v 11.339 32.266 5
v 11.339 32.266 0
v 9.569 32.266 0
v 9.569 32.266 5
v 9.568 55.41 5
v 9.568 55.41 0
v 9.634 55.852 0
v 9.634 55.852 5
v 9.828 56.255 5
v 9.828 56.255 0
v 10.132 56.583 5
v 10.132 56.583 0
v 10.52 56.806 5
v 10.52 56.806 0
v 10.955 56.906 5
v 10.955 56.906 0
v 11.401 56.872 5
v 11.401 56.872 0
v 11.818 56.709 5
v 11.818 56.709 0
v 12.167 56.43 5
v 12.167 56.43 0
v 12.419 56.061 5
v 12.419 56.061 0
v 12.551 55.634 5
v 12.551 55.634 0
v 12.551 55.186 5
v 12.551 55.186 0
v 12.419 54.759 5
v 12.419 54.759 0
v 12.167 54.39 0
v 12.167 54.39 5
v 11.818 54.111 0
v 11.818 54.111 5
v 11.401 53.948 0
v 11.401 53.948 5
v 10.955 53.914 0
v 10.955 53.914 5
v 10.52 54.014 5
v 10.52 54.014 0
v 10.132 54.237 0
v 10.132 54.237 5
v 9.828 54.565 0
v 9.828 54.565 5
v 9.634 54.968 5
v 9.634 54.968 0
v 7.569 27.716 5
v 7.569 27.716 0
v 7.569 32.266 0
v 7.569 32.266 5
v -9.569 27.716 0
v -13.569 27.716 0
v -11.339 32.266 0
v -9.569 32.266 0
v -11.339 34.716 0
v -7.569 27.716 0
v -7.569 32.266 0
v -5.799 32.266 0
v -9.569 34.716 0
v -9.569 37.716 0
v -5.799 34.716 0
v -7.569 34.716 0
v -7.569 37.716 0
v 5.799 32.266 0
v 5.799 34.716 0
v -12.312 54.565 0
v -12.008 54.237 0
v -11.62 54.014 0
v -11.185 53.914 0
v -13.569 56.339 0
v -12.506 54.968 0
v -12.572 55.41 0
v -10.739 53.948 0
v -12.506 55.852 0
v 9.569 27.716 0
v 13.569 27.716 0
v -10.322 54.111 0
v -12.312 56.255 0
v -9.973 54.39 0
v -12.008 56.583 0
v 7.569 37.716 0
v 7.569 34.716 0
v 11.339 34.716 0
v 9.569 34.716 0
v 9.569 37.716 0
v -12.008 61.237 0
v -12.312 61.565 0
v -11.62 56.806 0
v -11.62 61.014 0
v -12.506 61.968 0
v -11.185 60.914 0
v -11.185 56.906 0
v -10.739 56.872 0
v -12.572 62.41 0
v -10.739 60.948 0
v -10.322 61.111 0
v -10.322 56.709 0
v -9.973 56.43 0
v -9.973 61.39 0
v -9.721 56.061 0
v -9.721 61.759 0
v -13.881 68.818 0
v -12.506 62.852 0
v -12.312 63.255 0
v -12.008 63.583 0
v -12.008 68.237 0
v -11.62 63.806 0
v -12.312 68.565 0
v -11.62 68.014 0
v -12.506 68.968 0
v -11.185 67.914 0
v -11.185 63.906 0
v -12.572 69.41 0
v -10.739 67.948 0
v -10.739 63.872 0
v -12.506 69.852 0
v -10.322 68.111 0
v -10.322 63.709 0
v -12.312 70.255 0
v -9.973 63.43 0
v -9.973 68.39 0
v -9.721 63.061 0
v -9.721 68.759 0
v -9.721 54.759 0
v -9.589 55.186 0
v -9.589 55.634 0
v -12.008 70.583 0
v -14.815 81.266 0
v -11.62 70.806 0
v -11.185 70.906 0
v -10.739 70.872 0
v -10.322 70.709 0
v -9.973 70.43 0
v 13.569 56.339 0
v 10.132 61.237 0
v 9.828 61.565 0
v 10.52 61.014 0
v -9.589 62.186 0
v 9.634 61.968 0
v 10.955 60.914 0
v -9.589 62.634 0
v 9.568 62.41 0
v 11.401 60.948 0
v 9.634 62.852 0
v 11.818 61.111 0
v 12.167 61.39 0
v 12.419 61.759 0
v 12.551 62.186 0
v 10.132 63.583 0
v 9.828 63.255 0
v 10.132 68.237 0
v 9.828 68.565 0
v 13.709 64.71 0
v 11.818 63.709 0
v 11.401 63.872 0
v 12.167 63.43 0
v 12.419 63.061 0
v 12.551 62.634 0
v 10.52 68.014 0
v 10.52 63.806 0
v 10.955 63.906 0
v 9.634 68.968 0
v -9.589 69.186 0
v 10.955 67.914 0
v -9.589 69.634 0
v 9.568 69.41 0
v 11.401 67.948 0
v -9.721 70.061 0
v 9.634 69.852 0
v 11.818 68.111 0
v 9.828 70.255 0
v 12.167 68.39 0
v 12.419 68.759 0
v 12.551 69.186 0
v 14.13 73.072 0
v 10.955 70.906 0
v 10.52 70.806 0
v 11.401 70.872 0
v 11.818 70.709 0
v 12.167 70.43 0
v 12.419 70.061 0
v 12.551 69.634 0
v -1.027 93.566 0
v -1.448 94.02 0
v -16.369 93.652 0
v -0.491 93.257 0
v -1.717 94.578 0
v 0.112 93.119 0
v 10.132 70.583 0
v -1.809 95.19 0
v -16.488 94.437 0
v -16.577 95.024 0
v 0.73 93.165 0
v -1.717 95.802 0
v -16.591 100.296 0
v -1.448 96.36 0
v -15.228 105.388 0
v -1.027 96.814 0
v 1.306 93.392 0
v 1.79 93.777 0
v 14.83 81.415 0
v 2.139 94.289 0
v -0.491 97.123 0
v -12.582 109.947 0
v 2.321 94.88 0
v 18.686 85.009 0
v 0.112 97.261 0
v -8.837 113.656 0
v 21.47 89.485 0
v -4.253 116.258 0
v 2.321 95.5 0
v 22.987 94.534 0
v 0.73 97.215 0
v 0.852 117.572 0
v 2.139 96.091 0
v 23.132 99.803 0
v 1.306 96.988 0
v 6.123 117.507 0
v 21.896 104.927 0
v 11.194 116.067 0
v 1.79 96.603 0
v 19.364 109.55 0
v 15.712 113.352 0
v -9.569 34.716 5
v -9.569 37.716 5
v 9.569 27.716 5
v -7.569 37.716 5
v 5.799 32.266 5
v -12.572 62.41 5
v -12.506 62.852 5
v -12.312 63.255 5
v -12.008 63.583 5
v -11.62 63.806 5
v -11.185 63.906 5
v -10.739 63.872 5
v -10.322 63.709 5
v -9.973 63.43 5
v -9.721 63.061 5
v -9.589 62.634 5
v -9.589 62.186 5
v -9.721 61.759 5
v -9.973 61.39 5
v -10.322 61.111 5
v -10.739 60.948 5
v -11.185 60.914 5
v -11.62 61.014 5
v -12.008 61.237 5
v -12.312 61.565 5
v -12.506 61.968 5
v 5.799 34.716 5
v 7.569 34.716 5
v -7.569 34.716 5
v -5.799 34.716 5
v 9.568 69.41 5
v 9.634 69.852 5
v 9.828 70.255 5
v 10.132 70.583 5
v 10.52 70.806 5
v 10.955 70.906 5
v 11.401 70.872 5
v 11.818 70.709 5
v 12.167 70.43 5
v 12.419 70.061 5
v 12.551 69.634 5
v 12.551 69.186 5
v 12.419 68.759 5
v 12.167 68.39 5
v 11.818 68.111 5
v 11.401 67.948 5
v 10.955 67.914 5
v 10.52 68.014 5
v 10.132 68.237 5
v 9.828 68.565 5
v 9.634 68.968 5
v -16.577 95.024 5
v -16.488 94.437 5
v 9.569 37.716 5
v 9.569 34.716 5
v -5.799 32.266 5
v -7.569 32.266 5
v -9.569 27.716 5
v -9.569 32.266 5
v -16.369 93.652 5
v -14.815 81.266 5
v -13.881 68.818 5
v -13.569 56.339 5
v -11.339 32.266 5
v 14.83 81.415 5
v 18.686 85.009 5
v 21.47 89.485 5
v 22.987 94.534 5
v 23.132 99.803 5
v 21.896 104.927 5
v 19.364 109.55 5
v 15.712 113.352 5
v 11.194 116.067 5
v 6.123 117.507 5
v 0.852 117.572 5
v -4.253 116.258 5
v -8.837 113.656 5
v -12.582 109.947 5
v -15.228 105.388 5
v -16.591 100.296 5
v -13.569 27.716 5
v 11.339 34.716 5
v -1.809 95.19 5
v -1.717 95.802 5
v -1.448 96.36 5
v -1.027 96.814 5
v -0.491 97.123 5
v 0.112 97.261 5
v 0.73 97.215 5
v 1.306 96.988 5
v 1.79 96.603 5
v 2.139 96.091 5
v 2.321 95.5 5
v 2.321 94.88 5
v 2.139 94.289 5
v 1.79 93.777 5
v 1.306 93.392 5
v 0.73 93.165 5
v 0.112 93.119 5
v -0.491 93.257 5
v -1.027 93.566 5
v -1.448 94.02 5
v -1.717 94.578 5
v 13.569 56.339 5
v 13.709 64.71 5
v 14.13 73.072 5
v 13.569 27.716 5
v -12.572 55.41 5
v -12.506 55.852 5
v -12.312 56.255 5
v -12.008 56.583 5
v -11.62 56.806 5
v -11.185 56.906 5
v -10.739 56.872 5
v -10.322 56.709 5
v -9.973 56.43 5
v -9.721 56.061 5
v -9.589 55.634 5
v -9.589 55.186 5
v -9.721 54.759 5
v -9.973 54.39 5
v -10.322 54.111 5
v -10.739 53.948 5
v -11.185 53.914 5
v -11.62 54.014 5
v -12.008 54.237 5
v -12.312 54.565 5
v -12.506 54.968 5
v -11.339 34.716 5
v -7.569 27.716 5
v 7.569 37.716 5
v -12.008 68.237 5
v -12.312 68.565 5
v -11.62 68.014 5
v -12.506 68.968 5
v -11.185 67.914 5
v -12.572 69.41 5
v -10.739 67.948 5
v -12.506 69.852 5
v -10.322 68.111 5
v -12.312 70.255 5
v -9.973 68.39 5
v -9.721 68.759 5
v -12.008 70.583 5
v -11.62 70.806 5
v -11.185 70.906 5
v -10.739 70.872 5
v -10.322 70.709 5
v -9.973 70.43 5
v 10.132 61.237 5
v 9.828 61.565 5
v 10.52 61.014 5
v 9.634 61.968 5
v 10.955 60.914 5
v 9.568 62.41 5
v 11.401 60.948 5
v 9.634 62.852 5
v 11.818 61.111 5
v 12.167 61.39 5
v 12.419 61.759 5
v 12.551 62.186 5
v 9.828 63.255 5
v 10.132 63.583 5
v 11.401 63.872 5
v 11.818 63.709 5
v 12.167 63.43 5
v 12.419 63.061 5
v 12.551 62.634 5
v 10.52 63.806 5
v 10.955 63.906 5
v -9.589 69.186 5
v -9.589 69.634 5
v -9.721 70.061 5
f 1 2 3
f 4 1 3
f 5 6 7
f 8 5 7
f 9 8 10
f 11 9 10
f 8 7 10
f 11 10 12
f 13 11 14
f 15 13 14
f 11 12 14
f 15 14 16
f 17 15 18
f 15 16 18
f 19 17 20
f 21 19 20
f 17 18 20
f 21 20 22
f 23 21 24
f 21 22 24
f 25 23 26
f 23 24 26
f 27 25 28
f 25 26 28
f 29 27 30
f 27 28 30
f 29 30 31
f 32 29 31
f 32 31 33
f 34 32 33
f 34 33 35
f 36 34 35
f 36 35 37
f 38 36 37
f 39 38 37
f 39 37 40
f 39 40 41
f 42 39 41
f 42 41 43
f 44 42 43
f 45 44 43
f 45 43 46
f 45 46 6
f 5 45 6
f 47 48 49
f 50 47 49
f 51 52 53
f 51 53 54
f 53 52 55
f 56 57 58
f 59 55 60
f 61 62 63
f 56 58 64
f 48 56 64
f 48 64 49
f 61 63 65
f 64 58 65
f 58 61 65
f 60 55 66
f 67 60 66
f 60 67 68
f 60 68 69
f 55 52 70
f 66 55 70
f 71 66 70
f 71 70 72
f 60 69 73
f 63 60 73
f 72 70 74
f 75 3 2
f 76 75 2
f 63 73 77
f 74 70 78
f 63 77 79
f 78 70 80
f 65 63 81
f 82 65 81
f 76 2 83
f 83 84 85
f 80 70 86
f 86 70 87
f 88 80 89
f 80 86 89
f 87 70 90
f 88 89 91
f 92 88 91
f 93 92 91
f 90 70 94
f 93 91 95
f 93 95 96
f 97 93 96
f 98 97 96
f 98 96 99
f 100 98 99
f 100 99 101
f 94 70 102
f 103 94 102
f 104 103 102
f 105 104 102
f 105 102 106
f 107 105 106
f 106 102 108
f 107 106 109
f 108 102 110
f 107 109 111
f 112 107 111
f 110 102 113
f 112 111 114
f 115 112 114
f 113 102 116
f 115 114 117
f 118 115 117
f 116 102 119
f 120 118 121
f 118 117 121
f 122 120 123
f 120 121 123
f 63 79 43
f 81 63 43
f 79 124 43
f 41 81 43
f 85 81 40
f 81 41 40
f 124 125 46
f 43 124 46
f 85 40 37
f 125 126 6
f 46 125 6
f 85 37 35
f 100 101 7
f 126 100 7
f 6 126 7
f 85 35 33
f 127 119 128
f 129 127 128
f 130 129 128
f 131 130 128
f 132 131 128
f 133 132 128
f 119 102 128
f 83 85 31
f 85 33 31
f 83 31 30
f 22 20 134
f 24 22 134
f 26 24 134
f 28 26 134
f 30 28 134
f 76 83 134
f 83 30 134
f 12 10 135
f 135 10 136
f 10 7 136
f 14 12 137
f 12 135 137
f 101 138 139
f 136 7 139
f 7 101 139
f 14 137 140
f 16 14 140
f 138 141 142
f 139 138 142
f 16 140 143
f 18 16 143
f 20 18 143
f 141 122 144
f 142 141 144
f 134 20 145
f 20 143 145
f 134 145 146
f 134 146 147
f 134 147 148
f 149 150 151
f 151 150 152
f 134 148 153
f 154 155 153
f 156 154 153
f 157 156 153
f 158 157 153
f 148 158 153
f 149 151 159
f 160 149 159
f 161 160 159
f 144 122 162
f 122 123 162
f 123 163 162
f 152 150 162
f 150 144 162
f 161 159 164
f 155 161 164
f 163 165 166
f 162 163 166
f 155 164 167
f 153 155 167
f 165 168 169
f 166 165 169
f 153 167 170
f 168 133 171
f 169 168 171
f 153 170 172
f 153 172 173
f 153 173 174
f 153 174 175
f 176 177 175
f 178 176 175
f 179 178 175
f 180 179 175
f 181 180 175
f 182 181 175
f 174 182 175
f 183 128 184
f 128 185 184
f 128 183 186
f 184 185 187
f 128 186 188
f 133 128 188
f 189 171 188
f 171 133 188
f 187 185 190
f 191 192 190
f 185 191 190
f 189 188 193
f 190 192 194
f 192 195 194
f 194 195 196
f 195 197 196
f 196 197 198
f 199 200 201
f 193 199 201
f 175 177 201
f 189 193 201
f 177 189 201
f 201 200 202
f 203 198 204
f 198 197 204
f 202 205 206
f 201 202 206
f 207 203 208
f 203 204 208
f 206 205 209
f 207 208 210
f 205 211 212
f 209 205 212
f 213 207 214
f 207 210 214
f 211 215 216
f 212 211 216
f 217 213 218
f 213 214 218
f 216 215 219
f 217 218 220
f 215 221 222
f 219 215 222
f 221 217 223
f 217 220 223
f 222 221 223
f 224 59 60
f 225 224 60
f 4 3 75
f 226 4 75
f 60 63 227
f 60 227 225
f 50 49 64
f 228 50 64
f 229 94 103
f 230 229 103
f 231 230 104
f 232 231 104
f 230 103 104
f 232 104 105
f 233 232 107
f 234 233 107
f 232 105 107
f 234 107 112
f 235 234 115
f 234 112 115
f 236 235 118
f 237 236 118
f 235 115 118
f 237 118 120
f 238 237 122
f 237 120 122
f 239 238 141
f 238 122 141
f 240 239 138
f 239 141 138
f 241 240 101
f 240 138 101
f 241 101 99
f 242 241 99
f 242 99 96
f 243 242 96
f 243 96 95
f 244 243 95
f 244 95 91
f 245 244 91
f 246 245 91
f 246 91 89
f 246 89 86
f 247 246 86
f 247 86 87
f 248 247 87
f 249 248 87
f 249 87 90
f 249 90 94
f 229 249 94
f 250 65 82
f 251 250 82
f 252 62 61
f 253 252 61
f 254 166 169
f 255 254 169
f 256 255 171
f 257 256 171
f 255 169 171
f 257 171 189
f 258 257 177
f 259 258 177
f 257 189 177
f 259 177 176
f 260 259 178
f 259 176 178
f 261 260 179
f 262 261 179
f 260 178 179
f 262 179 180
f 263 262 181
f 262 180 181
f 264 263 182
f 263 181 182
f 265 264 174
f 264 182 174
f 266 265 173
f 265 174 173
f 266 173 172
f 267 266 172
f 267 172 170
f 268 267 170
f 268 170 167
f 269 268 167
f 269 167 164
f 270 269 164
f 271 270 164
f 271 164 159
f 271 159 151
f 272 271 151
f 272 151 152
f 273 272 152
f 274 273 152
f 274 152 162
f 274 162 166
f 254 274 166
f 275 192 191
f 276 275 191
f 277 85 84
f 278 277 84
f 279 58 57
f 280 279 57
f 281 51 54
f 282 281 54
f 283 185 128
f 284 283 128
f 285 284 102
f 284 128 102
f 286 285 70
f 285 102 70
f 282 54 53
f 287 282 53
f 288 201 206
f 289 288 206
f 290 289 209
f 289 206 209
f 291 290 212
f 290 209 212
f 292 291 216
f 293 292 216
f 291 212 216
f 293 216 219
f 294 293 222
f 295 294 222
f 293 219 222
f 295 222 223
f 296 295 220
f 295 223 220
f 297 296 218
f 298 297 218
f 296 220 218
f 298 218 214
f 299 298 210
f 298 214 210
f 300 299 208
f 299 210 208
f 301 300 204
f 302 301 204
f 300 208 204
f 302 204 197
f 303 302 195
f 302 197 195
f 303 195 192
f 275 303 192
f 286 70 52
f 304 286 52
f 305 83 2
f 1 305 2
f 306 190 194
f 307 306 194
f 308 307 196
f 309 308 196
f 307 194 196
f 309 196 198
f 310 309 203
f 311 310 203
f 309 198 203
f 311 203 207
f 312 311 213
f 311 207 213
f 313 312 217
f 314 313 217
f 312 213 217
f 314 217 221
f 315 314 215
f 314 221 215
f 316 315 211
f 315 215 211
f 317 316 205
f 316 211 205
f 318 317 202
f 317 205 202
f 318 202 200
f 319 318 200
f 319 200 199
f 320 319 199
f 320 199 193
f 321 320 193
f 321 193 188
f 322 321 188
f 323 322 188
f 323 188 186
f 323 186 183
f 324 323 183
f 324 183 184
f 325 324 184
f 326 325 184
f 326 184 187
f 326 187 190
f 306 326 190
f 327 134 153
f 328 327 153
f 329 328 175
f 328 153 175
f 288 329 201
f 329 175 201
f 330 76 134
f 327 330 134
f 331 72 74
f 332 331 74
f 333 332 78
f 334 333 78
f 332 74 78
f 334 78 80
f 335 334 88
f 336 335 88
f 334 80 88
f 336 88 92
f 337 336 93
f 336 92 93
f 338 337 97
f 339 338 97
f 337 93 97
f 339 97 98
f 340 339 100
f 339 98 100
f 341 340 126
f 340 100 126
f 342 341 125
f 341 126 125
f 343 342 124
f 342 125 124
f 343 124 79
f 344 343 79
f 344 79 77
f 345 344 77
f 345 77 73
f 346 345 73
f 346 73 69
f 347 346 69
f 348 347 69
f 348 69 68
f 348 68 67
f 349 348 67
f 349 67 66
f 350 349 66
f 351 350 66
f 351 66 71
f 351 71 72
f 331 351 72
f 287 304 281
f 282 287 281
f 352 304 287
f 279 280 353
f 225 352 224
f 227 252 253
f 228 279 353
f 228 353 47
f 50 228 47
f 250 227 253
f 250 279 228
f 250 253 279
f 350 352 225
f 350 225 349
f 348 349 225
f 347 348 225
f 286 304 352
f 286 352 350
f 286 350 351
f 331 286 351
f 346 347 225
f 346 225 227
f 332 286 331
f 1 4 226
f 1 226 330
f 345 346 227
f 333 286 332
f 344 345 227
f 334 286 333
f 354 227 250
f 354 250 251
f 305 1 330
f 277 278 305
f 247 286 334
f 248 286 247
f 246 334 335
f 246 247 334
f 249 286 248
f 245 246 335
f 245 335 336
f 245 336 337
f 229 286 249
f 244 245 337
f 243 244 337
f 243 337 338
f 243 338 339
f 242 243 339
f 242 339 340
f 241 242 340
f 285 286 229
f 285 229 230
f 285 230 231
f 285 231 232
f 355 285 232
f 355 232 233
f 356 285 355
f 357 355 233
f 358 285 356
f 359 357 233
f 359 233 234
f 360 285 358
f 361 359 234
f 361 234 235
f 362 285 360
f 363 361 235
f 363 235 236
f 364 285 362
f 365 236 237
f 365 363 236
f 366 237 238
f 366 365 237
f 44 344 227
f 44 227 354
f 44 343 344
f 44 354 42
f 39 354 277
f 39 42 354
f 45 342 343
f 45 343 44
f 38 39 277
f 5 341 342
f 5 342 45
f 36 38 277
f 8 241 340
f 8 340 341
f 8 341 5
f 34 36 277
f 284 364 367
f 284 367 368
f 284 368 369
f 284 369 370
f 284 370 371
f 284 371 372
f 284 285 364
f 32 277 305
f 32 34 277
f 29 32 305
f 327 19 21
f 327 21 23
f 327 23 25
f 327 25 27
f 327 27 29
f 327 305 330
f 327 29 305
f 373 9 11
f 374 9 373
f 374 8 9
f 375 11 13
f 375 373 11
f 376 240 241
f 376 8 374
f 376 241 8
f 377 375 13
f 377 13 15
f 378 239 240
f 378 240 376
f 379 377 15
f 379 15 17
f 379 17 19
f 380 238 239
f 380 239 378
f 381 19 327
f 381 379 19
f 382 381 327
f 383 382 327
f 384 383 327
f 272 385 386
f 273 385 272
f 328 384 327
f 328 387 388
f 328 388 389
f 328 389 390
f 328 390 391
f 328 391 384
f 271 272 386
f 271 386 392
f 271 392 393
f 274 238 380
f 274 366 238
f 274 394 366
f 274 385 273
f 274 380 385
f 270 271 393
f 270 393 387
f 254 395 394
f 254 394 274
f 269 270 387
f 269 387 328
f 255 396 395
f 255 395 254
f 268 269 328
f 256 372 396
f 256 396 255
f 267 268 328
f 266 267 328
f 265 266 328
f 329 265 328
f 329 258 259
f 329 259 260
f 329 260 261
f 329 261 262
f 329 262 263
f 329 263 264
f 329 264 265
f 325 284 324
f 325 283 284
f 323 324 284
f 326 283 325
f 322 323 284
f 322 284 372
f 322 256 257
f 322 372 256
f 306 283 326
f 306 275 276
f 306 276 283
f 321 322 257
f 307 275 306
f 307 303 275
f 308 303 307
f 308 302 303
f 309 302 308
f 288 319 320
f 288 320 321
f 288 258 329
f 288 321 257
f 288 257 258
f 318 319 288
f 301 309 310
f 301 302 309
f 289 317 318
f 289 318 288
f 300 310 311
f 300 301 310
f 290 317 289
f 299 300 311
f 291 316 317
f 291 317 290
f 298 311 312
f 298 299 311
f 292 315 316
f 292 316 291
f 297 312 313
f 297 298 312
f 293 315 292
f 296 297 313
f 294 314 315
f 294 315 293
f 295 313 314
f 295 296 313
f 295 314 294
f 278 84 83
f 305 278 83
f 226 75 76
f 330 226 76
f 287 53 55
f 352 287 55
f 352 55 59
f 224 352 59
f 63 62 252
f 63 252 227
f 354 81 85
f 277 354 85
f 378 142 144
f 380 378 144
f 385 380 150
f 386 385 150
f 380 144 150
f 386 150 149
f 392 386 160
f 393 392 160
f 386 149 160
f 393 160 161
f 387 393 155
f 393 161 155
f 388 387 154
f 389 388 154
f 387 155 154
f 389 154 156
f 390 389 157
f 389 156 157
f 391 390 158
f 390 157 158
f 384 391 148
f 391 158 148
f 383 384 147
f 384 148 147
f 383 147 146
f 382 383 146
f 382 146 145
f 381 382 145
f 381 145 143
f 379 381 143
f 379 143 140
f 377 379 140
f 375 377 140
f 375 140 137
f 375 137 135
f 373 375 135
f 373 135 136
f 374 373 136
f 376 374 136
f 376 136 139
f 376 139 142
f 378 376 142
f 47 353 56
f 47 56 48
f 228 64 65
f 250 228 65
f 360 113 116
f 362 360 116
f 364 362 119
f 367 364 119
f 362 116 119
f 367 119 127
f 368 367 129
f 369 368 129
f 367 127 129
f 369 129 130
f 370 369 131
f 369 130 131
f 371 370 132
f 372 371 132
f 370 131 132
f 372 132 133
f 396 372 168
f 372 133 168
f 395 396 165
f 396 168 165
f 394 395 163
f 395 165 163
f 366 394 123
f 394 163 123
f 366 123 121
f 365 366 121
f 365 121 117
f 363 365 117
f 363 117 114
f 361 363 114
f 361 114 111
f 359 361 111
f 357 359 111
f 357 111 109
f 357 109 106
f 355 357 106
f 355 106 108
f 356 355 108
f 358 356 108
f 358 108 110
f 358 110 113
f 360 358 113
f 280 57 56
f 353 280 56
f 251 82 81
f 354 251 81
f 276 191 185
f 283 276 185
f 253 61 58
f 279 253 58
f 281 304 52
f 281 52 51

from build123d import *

# Parameters (mm, degrees)
RESSALTO_EXTRUS_O1_DEPTH = 5
ESBO_O7_R                = 2.076684074
CORTE_EXTRUS_O5_DEPTH    = 6
ESBO_O8_W                = 32.941442616
ESBO_O8_H                = 7.70353162
CORTE_EXTRUS_O6_DEPTH    = 6
ESBO_O9_R                = 1.5
CORTE_EXTRUS_O7_DEPTH    = 6
ESBO_O10_W               = 2
ESBO_O10_H               = 3
CORTE_EXTRUS_O8_DEPTH    = 6


with BuildPart() as part:
    # Esboço1 → Ressalto-extrusão1 (new body)
    with BuildSketch(Plane.XY):
        with BuildLine():
            Line((13.569146061, 27.715579822), (13.569146061, 56.338894978))
            ThreePointArc((13.569146061, 56.338894978), (13.884544414, 68.892766914), (14.829943665, 81.414963086))
            ThreePointArc((14.829943665, 81.414963086), (11.193742071, 116.066691762), (-16.576524471, 95.024435265))
            Line((-16.576524471, 95.024435265), (-16.487894969, 94.437265709))
            Line((-16.487894969, 94.437265709), (-16.369382775, 93.652123615))
            ThreePointArc((-16.369382775, 93.652123615), (-14.270188159, 75.047972701), (-13.569146061, 56.338894978))
            Line((-13.569146061, 56.338894978), (-13.569146061, 27.715579822))
            ThreePointArc((-13.569146061, 27.715579822), (0, 21.02683783), (13.569146061, 27.715579822))
        make_face()
    extrude(amount=RESSALTO_EXTRUS_O1_DEPTH)

    # Esboço7 → Corte-extrusão5 (cut, through all)
    with BuildSketch(Plane(origin=(0, 0, 0), x_dir=(-1, 0, 0), z_dir=(0, 0, -1))):
        with Locations((-0.267564972, 95.19)):
            Circle(ESBO_O7_R)
    extrude(amount=-CORTE_EXTRUS_O5_DEPTH, mode=Mode.SUBTRACT)

    # Esboço8 → Corte-extrusão6 (cut, through all)
    with BuildSketch(Plane.XY.offset(5)):
        with Locations((-2.901575247, 23.863814012)):
            Rectangle(ESBO_O8_W, ESBO_O8_H)
    extrude(amount=-CORTE_EXTRUS_O6_DEPTH, mode=Mode.SUBTRACT)

    # Esboço9 → Corte-extrusão7 (cut, through all)
    with BuildSketch(Plane(origin=(0, 0, 0), x_dir=(-1, 0, 0), z_dir=(0, 0, -1))):
        with Locations((11.072435028, 69.41)):
            Circle(ESBO_O9_R)
        with Locations((11.072435028, 62.41)):
            Circle(ESBO_O9_R)
        with Locations((11.072435028, 55.41)):
            Circle(ESBO_O9_R)
        with Locations((-11.067564972, 69.41)):
            Circle(ESBO_O9_R)
        with Locations((-11.067564972, 62.41)):
            Circle(ESBO_O9_R)
        with Locations((-11.067564972, 55.41)):
            Circle(ESBO_O9_R)
    extrude(amount=-CORTE_EXTRUS_O7_DEPTH, mode=Mode.SUBTRACT)

    # Esboço10 → Corte-extrusão8 (cut, through all)
    with BuildSketch(Plane(origin=(0, 0, 0), x_dir=(-1, 0, 0), z_dir=(0, 0, -1))):
        Polygon((7.569146061, 27.715579822), (9.569146061, 27.715579822), (9.569146061, 32.265579822), (11.339146061, 32.265579822), (11.339146061, 34.715579822), (9.569146061, 34.715579822), (7.569146061, 34.715579822), (5.799146061, 34.715579822), (5.799146061, 32.265579822), (7.569146061, 32.265579822), align=None)
        with Locations((8.569146061, 36.215579822)):
            Rectangle(ESBO_O10_W, ESBO_O10_H)
        Polygon((-9.569146061, 27.715579822), (-7.569146061, 27.715579822), (-7.569146061, 32.265579822), (-5.799146061, 32.265579822), (-5.799146061, 34.715579822), (-7.569146061, 34.715579822), (-7.569146061, 37.715579822), (-9.569146061, 37.715579822), (-9.569146061, 34.715579822), (-11.339146061, 34.715579822), (-11.339146061, 32.265579822), (-9.569146061, 32.265579822), align=None)
    extrude(amount=-CORTE_EXTRUS_O8_DEPTH, mode=Mode.SUBTRACT)


solid = part.part
